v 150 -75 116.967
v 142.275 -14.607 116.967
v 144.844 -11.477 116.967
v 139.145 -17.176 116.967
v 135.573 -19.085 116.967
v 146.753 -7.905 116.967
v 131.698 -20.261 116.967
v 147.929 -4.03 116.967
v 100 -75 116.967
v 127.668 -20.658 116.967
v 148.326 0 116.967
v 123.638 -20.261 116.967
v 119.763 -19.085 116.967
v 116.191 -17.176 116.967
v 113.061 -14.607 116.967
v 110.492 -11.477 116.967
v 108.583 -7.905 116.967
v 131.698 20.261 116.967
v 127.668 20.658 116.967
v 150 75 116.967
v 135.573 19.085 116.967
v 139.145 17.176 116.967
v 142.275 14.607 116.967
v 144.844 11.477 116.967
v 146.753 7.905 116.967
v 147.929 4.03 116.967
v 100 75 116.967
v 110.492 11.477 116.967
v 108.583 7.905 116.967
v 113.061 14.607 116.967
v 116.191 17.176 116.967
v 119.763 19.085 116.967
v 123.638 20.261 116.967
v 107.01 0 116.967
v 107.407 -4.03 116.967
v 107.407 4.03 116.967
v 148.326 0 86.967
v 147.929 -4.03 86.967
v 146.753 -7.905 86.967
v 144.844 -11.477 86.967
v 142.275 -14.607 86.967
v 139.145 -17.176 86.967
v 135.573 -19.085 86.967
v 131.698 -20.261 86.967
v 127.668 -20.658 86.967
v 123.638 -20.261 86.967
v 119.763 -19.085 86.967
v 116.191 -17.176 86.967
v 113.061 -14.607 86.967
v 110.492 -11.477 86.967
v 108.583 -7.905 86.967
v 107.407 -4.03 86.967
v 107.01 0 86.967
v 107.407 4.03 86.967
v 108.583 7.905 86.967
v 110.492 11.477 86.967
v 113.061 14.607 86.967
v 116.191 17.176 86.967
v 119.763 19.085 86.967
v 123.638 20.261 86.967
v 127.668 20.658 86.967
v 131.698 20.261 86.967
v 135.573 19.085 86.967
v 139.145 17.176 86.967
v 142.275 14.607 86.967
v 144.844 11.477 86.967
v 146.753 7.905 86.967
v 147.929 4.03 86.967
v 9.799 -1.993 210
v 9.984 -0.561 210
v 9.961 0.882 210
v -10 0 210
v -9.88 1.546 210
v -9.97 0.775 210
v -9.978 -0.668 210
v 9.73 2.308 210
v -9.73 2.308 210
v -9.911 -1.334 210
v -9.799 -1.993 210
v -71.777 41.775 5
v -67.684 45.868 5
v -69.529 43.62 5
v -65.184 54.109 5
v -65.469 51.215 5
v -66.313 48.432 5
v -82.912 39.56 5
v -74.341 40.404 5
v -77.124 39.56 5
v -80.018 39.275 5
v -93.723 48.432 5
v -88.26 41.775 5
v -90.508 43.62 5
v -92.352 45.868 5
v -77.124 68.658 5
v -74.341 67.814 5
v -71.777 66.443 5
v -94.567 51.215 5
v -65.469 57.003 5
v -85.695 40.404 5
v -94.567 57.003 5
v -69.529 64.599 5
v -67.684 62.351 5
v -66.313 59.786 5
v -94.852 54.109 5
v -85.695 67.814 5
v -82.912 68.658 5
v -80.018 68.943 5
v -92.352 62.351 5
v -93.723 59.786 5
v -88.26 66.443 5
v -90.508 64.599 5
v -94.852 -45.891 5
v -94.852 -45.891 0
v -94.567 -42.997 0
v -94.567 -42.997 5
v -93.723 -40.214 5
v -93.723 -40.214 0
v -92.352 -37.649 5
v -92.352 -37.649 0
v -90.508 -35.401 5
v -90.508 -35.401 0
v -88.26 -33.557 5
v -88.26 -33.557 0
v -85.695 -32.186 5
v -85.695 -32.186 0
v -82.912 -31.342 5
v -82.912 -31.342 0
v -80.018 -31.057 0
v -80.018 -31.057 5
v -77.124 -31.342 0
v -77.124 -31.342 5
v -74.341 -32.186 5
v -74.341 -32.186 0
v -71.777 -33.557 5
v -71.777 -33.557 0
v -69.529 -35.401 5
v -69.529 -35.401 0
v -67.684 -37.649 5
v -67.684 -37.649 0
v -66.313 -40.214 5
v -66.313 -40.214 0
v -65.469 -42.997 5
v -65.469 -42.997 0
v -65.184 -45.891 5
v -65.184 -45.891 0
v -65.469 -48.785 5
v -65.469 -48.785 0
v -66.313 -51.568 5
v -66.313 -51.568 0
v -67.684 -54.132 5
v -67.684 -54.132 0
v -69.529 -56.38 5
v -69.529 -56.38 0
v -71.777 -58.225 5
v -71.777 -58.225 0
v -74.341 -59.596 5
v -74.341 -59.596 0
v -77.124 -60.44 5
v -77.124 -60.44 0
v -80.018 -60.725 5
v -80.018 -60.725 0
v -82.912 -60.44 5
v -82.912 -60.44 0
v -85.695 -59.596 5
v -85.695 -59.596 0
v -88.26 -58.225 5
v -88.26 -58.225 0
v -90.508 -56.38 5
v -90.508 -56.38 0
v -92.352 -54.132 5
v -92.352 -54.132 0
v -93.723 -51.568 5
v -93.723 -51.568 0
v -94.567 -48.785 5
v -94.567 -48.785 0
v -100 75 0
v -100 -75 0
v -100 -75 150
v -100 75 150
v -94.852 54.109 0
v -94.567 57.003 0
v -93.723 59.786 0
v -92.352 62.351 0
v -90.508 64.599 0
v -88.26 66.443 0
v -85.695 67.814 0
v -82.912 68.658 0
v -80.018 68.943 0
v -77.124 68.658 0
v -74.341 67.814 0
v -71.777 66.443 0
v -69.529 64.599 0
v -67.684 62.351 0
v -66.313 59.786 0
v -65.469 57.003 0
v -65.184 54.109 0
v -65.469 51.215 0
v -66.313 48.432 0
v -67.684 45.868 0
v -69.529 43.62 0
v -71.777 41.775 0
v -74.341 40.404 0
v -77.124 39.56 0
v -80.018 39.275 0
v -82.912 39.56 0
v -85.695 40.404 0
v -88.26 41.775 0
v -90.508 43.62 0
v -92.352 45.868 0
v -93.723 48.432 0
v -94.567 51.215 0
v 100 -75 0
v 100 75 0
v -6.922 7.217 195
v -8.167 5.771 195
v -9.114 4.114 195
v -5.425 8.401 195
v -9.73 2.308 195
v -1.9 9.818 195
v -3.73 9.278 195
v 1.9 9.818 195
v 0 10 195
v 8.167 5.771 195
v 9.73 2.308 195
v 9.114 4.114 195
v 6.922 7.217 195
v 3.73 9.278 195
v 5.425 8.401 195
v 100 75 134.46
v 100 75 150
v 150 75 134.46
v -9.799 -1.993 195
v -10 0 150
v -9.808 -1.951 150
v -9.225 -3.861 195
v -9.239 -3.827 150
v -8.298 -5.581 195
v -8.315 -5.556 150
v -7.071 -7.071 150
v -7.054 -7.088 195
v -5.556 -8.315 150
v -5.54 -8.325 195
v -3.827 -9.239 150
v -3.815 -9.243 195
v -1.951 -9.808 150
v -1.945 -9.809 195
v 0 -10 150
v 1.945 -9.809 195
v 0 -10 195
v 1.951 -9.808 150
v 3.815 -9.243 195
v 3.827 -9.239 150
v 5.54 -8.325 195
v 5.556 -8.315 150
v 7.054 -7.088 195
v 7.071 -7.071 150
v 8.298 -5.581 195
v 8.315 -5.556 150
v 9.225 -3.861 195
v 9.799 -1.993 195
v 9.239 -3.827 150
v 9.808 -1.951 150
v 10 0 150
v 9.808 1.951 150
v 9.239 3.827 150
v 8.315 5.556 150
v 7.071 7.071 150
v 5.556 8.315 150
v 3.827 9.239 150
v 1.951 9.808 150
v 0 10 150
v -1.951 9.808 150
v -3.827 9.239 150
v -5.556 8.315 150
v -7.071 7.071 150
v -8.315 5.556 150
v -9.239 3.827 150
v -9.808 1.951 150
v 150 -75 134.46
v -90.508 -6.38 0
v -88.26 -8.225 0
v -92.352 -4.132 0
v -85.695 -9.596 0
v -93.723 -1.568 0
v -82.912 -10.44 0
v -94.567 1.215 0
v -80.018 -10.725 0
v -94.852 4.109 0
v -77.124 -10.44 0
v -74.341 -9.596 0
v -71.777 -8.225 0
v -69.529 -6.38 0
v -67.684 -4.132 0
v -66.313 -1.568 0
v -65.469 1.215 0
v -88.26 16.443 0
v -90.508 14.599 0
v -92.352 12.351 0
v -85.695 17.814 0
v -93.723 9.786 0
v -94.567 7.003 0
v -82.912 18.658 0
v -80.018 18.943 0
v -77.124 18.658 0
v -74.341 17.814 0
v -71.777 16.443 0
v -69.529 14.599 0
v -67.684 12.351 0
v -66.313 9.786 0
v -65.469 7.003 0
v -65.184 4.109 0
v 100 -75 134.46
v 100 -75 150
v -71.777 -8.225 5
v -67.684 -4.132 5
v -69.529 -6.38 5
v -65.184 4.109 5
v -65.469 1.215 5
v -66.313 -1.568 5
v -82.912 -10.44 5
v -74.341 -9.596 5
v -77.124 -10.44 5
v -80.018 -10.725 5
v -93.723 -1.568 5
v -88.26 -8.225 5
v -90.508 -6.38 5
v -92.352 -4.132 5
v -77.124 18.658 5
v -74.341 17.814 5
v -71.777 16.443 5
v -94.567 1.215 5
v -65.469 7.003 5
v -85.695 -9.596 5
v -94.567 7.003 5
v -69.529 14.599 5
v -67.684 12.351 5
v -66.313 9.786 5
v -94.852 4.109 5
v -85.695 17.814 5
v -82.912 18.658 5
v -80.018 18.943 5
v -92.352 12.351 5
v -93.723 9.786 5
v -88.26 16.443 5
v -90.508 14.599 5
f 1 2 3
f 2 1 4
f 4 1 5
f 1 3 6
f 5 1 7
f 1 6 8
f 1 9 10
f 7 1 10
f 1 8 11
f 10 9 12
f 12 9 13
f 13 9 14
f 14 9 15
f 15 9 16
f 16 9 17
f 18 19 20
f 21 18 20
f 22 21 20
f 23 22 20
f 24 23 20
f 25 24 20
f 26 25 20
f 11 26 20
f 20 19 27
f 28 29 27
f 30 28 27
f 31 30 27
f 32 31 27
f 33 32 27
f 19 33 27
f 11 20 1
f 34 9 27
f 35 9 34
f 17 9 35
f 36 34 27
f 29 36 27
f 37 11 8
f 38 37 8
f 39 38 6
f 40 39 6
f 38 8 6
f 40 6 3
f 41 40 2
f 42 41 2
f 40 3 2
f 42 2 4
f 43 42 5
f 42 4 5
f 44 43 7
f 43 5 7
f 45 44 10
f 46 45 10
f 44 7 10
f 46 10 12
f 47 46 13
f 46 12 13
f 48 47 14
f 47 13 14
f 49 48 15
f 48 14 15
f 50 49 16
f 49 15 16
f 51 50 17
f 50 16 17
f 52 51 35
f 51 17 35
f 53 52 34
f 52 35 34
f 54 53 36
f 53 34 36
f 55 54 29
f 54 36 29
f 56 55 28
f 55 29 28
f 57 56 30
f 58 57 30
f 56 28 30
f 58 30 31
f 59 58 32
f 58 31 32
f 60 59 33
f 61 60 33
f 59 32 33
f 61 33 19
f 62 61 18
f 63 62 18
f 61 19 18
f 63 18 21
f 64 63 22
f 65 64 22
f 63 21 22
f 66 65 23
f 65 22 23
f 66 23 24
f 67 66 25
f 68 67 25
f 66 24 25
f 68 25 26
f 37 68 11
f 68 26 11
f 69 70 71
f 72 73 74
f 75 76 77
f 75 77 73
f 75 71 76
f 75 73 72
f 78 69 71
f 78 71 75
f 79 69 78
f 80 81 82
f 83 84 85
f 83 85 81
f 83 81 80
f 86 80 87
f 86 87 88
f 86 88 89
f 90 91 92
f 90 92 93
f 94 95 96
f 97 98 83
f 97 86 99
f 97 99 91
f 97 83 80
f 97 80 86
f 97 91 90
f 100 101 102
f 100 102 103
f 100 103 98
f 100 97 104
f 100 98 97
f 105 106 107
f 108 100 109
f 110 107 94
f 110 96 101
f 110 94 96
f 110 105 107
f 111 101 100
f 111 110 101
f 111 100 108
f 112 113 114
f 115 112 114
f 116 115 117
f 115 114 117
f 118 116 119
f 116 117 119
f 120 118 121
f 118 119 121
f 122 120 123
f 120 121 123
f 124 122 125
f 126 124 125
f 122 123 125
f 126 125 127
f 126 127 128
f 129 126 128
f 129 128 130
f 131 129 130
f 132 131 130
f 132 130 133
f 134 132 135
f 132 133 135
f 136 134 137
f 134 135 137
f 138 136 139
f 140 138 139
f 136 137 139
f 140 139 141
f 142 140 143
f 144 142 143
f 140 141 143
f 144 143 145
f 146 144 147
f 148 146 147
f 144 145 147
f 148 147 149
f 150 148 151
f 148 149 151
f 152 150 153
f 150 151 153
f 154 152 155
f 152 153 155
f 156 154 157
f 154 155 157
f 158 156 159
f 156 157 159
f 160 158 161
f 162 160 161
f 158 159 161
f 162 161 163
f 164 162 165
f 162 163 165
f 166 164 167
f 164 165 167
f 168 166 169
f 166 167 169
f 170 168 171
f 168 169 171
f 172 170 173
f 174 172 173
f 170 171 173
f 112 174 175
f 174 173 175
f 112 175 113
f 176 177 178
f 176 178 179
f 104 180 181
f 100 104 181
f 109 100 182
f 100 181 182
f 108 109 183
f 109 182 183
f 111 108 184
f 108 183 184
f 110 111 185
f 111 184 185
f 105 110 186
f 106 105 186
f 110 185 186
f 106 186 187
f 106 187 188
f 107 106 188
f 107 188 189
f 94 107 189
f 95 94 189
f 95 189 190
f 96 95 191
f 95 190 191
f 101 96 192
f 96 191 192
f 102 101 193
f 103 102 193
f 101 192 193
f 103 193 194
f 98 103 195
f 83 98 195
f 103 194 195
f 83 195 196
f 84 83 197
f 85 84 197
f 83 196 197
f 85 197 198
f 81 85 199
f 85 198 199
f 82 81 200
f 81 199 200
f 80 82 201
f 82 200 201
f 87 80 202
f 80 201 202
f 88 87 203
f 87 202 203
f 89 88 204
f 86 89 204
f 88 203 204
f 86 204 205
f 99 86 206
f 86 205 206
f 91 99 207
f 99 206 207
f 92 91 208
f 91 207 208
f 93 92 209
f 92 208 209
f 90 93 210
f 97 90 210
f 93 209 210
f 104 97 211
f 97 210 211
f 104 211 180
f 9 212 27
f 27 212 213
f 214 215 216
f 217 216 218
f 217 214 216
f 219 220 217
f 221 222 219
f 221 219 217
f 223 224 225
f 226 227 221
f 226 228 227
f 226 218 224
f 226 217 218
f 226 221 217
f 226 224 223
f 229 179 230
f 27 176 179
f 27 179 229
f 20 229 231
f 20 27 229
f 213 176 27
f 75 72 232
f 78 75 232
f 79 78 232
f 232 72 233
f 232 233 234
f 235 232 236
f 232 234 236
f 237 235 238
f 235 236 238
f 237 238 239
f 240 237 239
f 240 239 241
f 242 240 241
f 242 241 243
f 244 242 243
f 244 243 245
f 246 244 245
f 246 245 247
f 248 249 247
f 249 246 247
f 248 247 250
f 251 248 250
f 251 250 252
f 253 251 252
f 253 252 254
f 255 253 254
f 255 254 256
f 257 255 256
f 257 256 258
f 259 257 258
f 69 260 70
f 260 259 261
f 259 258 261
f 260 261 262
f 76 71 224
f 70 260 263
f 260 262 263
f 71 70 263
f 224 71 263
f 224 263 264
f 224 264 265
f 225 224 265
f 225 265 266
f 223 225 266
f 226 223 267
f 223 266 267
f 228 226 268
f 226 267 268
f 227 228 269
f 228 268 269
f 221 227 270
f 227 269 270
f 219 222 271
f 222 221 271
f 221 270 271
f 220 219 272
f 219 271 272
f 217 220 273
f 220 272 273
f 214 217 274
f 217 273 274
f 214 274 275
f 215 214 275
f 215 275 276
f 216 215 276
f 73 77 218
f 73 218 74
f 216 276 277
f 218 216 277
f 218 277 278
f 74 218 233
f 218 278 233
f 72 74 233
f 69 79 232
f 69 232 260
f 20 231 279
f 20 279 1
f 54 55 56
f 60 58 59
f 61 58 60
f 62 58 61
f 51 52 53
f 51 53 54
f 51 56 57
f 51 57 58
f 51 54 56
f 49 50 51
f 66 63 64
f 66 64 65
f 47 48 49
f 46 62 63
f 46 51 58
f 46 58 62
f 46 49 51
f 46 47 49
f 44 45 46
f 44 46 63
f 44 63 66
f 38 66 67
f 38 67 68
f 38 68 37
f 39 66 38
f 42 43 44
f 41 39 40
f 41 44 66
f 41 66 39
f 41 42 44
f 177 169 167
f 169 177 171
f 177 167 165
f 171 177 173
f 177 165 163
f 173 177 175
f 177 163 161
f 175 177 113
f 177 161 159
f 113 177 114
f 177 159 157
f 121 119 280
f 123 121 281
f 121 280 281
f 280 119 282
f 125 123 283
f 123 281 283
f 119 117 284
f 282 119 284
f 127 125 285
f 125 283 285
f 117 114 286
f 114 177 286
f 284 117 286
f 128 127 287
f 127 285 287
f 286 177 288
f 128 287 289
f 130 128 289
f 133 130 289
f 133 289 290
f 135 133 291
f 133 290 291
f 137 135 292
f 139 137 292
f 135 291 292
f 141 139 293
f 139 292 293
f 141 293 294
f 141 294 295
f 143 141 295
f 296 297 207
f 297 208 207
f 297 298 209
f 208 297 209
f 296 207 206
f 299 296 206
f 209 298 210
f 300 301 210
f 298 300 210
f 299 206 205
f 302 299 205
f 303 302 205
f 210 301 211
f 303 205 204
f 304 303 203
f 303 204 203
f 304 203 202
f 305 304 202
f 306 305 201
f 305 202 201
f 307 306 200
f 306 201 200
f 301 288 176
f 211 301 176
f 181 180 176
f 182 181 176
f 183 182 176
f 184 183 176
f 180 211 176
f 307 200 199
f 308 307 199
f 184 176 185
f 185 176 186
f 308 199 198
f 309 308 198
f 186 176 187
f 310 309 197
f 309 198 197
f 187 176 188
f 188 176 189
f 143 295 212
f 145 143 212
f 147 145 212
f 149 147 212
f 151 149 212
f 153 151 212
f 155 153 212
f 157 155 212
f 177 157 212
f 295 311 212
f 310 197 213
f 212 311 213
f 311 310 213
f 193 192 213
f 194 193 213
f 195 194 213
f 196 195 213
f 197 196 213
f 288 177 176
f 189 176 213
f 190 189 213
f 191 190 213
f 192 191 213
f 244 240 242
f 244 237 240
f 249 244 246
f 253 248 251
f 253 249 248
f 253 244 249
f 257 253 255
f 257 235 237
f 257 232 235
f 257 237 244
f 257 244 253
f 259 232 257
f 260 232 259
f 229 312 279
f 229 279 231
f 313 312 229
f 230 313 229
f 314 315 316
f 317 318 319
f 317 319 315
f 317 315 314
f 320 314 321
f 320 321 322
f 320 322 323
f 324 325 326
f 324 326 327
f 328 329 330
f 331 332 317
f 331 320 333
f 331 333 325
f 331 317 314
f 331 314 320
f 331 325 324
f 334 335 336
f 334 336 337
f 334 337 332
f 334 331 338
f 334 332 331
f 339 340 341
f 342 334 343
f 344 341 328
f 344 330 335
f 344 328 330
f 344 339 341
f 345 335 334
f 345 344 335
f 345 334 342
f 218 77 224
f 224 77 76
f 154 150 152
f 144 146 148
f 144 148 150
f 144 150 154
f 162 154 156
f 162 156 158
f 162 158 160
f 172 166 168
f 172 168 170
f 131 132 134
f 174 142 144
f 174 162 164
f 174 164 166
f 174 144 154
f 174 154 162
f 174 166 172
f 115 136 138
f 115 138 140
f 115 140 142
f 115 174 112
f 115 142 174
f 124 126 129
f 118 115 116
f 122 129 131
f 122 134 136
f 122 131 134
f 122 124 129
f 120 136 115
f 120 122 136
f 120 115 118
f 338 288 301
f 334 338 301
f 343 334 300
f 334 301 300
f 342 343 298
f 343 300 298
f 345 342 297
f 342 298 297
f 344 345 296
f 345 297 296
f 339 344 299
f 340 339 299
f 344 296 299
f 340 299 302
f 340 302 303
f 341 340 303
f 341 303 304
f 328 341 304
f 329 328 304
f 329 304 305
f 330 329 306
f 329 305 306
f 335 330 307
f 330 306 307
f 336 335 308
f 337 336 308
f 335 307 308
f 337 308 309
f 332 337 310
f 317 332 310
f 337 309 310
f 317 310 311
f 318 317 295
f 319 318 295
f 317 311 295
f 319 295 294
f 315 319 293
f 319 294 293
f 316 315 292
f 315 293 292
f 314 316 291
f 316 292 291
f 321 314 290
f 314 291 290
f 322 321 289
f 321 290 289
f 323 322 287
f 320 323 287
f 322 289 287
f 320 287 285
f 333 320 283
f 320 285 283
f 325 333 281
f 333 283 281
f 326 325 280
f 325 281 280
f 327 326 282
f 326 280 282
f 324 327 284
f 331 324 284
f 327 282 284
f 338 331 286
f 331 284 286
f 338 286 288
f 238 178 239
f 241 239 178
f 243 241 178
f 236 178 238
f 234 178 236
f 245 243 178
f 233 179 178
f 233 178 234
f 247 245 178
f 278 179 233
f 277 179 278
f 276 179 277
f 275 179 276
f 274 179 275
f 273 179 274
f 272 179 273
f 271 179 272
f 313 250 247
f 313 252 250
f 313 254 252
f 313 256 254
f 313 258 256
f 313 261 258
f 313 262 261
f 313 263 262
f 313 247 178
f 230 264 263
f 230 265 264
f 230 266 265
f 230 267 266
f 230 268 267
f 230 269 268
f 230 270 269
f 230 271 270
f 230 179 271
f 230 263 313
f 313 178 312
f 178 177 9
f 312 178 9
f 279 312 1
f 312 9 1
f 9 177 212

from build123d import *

# Parameters (mm, degrees)
SKETCH1_W           = 200
SKETCH1_H           = 150
BOSS_EXTRUDE1_DEPTH = 150
SKETCH2_R           = 14.834241456
CUT_EXTRUDE1_DEPTH  = 5
LPATTERN1_COUNT     = 3
LPATTERN1_PITCH     = 50
SKETCH3_W           = 17.49362466
SKETCH3_H           = 150
BOSS_EXTRUDE2_DEPTH = 50
SKETCH4_R           = 20.657727603
BOSS_EXTRUDE3_DEPTH = 30
SKETCH5_R           = 10
BOSS_EXTRUDE4_DEPTH = 60
SKETCH6_W           = 19.92759369
SKETCH6_H           = 8.419652836
SKETCH6_W_2         = 21.376212584
SKETCH6_H_2         = 8.0068992
CUT_EXTRUDE2_DEPTH  = 15


with BuildPart() as part:
    # Sketch1 → Boss-Extrude1 (new body)
    with BuildSketch(Plane.XY):
        Rectangle(SKETCH1_W, SKETCH1_H)
    extrude(amount=BOSS_EXTRUDE1_DEPTH)

    # Sketch2 → Cut-Extrude1 (cut)
    with BuildSketch(Plane(origin=(0, 0, 0), x_dir=(-1, 0, 0), z_dir=(0, 0, -1))):
        with Locations((80.018238541, 54.109118562)):
            Circle(SKETCH2_R)
    cut_extrude1 = extrude(amount=-CUT_EXTRUDE1_DEPTH, mode=Mode.SUBTRACT)

    # LPattern1: Cut-Extrude1 ×3
    with Locations(*[(0, -i * LPATTERN1_PITCH, 0) for i in range(1, LPATTERN1_COUNT)]):
        add(cut_extrude1, mode=Mode.SUBTRACT)

    # Sketch3 → Boss-Extrude2 (add)
    with BuildSketch(Plane(origin=(100, 0, 0), x_dir=(0, 0, -1), z_dir=(1, 0, 0))):
        with Locations((-125.713599326, 0)):
            Rectangle(SKETCH3_W, SKETCH3_H)
    extrude(amount=BOSS_EXTRUDE2_DEPTH)

    # Sketch4 → Boss-Extrude3 (add)
    with BuildSketch(Plane(origin=(0, 0, 116.966786996), x_dir=(-1, 0, 0), z_dir=(0, 0, -1))):
        with Locations(Location((-127.668059081, 0, 0), (0, 0, 180))):
            Circle(SKETCH4_R)
    extrude(amount=BOSS_EXTRUDE3_DEPTH)

    # Sketch5 → Boss-Extrude4 (add)
    with BuildSketch(Plane.XY.offset(150)):
        with Locations(Location((0, 0, 0), (0, 0, 180))):
            Circle(SKETCH5_R)
    extrude(amount=BOSS_EXTRUDE4_DEPTH)

    # Sketch6 → Cut-Extrude2 (cut)
    with BuildSketch(Plane.XY.offset(210)):
        with Locations((0.233720093, 6.517553958)):
            Rectangle(SKETCH6_W, SKETCH6_H)
        with Locations((-0.888741557, -5.9965504)):
            Rectangle(SKETCH6_W_2, SKETCH6_H_2)
    extrude(amount=-CUT_EXTRUDE2_DEPTH, mode=Mode.SUBTRACT)


solid = part.part
